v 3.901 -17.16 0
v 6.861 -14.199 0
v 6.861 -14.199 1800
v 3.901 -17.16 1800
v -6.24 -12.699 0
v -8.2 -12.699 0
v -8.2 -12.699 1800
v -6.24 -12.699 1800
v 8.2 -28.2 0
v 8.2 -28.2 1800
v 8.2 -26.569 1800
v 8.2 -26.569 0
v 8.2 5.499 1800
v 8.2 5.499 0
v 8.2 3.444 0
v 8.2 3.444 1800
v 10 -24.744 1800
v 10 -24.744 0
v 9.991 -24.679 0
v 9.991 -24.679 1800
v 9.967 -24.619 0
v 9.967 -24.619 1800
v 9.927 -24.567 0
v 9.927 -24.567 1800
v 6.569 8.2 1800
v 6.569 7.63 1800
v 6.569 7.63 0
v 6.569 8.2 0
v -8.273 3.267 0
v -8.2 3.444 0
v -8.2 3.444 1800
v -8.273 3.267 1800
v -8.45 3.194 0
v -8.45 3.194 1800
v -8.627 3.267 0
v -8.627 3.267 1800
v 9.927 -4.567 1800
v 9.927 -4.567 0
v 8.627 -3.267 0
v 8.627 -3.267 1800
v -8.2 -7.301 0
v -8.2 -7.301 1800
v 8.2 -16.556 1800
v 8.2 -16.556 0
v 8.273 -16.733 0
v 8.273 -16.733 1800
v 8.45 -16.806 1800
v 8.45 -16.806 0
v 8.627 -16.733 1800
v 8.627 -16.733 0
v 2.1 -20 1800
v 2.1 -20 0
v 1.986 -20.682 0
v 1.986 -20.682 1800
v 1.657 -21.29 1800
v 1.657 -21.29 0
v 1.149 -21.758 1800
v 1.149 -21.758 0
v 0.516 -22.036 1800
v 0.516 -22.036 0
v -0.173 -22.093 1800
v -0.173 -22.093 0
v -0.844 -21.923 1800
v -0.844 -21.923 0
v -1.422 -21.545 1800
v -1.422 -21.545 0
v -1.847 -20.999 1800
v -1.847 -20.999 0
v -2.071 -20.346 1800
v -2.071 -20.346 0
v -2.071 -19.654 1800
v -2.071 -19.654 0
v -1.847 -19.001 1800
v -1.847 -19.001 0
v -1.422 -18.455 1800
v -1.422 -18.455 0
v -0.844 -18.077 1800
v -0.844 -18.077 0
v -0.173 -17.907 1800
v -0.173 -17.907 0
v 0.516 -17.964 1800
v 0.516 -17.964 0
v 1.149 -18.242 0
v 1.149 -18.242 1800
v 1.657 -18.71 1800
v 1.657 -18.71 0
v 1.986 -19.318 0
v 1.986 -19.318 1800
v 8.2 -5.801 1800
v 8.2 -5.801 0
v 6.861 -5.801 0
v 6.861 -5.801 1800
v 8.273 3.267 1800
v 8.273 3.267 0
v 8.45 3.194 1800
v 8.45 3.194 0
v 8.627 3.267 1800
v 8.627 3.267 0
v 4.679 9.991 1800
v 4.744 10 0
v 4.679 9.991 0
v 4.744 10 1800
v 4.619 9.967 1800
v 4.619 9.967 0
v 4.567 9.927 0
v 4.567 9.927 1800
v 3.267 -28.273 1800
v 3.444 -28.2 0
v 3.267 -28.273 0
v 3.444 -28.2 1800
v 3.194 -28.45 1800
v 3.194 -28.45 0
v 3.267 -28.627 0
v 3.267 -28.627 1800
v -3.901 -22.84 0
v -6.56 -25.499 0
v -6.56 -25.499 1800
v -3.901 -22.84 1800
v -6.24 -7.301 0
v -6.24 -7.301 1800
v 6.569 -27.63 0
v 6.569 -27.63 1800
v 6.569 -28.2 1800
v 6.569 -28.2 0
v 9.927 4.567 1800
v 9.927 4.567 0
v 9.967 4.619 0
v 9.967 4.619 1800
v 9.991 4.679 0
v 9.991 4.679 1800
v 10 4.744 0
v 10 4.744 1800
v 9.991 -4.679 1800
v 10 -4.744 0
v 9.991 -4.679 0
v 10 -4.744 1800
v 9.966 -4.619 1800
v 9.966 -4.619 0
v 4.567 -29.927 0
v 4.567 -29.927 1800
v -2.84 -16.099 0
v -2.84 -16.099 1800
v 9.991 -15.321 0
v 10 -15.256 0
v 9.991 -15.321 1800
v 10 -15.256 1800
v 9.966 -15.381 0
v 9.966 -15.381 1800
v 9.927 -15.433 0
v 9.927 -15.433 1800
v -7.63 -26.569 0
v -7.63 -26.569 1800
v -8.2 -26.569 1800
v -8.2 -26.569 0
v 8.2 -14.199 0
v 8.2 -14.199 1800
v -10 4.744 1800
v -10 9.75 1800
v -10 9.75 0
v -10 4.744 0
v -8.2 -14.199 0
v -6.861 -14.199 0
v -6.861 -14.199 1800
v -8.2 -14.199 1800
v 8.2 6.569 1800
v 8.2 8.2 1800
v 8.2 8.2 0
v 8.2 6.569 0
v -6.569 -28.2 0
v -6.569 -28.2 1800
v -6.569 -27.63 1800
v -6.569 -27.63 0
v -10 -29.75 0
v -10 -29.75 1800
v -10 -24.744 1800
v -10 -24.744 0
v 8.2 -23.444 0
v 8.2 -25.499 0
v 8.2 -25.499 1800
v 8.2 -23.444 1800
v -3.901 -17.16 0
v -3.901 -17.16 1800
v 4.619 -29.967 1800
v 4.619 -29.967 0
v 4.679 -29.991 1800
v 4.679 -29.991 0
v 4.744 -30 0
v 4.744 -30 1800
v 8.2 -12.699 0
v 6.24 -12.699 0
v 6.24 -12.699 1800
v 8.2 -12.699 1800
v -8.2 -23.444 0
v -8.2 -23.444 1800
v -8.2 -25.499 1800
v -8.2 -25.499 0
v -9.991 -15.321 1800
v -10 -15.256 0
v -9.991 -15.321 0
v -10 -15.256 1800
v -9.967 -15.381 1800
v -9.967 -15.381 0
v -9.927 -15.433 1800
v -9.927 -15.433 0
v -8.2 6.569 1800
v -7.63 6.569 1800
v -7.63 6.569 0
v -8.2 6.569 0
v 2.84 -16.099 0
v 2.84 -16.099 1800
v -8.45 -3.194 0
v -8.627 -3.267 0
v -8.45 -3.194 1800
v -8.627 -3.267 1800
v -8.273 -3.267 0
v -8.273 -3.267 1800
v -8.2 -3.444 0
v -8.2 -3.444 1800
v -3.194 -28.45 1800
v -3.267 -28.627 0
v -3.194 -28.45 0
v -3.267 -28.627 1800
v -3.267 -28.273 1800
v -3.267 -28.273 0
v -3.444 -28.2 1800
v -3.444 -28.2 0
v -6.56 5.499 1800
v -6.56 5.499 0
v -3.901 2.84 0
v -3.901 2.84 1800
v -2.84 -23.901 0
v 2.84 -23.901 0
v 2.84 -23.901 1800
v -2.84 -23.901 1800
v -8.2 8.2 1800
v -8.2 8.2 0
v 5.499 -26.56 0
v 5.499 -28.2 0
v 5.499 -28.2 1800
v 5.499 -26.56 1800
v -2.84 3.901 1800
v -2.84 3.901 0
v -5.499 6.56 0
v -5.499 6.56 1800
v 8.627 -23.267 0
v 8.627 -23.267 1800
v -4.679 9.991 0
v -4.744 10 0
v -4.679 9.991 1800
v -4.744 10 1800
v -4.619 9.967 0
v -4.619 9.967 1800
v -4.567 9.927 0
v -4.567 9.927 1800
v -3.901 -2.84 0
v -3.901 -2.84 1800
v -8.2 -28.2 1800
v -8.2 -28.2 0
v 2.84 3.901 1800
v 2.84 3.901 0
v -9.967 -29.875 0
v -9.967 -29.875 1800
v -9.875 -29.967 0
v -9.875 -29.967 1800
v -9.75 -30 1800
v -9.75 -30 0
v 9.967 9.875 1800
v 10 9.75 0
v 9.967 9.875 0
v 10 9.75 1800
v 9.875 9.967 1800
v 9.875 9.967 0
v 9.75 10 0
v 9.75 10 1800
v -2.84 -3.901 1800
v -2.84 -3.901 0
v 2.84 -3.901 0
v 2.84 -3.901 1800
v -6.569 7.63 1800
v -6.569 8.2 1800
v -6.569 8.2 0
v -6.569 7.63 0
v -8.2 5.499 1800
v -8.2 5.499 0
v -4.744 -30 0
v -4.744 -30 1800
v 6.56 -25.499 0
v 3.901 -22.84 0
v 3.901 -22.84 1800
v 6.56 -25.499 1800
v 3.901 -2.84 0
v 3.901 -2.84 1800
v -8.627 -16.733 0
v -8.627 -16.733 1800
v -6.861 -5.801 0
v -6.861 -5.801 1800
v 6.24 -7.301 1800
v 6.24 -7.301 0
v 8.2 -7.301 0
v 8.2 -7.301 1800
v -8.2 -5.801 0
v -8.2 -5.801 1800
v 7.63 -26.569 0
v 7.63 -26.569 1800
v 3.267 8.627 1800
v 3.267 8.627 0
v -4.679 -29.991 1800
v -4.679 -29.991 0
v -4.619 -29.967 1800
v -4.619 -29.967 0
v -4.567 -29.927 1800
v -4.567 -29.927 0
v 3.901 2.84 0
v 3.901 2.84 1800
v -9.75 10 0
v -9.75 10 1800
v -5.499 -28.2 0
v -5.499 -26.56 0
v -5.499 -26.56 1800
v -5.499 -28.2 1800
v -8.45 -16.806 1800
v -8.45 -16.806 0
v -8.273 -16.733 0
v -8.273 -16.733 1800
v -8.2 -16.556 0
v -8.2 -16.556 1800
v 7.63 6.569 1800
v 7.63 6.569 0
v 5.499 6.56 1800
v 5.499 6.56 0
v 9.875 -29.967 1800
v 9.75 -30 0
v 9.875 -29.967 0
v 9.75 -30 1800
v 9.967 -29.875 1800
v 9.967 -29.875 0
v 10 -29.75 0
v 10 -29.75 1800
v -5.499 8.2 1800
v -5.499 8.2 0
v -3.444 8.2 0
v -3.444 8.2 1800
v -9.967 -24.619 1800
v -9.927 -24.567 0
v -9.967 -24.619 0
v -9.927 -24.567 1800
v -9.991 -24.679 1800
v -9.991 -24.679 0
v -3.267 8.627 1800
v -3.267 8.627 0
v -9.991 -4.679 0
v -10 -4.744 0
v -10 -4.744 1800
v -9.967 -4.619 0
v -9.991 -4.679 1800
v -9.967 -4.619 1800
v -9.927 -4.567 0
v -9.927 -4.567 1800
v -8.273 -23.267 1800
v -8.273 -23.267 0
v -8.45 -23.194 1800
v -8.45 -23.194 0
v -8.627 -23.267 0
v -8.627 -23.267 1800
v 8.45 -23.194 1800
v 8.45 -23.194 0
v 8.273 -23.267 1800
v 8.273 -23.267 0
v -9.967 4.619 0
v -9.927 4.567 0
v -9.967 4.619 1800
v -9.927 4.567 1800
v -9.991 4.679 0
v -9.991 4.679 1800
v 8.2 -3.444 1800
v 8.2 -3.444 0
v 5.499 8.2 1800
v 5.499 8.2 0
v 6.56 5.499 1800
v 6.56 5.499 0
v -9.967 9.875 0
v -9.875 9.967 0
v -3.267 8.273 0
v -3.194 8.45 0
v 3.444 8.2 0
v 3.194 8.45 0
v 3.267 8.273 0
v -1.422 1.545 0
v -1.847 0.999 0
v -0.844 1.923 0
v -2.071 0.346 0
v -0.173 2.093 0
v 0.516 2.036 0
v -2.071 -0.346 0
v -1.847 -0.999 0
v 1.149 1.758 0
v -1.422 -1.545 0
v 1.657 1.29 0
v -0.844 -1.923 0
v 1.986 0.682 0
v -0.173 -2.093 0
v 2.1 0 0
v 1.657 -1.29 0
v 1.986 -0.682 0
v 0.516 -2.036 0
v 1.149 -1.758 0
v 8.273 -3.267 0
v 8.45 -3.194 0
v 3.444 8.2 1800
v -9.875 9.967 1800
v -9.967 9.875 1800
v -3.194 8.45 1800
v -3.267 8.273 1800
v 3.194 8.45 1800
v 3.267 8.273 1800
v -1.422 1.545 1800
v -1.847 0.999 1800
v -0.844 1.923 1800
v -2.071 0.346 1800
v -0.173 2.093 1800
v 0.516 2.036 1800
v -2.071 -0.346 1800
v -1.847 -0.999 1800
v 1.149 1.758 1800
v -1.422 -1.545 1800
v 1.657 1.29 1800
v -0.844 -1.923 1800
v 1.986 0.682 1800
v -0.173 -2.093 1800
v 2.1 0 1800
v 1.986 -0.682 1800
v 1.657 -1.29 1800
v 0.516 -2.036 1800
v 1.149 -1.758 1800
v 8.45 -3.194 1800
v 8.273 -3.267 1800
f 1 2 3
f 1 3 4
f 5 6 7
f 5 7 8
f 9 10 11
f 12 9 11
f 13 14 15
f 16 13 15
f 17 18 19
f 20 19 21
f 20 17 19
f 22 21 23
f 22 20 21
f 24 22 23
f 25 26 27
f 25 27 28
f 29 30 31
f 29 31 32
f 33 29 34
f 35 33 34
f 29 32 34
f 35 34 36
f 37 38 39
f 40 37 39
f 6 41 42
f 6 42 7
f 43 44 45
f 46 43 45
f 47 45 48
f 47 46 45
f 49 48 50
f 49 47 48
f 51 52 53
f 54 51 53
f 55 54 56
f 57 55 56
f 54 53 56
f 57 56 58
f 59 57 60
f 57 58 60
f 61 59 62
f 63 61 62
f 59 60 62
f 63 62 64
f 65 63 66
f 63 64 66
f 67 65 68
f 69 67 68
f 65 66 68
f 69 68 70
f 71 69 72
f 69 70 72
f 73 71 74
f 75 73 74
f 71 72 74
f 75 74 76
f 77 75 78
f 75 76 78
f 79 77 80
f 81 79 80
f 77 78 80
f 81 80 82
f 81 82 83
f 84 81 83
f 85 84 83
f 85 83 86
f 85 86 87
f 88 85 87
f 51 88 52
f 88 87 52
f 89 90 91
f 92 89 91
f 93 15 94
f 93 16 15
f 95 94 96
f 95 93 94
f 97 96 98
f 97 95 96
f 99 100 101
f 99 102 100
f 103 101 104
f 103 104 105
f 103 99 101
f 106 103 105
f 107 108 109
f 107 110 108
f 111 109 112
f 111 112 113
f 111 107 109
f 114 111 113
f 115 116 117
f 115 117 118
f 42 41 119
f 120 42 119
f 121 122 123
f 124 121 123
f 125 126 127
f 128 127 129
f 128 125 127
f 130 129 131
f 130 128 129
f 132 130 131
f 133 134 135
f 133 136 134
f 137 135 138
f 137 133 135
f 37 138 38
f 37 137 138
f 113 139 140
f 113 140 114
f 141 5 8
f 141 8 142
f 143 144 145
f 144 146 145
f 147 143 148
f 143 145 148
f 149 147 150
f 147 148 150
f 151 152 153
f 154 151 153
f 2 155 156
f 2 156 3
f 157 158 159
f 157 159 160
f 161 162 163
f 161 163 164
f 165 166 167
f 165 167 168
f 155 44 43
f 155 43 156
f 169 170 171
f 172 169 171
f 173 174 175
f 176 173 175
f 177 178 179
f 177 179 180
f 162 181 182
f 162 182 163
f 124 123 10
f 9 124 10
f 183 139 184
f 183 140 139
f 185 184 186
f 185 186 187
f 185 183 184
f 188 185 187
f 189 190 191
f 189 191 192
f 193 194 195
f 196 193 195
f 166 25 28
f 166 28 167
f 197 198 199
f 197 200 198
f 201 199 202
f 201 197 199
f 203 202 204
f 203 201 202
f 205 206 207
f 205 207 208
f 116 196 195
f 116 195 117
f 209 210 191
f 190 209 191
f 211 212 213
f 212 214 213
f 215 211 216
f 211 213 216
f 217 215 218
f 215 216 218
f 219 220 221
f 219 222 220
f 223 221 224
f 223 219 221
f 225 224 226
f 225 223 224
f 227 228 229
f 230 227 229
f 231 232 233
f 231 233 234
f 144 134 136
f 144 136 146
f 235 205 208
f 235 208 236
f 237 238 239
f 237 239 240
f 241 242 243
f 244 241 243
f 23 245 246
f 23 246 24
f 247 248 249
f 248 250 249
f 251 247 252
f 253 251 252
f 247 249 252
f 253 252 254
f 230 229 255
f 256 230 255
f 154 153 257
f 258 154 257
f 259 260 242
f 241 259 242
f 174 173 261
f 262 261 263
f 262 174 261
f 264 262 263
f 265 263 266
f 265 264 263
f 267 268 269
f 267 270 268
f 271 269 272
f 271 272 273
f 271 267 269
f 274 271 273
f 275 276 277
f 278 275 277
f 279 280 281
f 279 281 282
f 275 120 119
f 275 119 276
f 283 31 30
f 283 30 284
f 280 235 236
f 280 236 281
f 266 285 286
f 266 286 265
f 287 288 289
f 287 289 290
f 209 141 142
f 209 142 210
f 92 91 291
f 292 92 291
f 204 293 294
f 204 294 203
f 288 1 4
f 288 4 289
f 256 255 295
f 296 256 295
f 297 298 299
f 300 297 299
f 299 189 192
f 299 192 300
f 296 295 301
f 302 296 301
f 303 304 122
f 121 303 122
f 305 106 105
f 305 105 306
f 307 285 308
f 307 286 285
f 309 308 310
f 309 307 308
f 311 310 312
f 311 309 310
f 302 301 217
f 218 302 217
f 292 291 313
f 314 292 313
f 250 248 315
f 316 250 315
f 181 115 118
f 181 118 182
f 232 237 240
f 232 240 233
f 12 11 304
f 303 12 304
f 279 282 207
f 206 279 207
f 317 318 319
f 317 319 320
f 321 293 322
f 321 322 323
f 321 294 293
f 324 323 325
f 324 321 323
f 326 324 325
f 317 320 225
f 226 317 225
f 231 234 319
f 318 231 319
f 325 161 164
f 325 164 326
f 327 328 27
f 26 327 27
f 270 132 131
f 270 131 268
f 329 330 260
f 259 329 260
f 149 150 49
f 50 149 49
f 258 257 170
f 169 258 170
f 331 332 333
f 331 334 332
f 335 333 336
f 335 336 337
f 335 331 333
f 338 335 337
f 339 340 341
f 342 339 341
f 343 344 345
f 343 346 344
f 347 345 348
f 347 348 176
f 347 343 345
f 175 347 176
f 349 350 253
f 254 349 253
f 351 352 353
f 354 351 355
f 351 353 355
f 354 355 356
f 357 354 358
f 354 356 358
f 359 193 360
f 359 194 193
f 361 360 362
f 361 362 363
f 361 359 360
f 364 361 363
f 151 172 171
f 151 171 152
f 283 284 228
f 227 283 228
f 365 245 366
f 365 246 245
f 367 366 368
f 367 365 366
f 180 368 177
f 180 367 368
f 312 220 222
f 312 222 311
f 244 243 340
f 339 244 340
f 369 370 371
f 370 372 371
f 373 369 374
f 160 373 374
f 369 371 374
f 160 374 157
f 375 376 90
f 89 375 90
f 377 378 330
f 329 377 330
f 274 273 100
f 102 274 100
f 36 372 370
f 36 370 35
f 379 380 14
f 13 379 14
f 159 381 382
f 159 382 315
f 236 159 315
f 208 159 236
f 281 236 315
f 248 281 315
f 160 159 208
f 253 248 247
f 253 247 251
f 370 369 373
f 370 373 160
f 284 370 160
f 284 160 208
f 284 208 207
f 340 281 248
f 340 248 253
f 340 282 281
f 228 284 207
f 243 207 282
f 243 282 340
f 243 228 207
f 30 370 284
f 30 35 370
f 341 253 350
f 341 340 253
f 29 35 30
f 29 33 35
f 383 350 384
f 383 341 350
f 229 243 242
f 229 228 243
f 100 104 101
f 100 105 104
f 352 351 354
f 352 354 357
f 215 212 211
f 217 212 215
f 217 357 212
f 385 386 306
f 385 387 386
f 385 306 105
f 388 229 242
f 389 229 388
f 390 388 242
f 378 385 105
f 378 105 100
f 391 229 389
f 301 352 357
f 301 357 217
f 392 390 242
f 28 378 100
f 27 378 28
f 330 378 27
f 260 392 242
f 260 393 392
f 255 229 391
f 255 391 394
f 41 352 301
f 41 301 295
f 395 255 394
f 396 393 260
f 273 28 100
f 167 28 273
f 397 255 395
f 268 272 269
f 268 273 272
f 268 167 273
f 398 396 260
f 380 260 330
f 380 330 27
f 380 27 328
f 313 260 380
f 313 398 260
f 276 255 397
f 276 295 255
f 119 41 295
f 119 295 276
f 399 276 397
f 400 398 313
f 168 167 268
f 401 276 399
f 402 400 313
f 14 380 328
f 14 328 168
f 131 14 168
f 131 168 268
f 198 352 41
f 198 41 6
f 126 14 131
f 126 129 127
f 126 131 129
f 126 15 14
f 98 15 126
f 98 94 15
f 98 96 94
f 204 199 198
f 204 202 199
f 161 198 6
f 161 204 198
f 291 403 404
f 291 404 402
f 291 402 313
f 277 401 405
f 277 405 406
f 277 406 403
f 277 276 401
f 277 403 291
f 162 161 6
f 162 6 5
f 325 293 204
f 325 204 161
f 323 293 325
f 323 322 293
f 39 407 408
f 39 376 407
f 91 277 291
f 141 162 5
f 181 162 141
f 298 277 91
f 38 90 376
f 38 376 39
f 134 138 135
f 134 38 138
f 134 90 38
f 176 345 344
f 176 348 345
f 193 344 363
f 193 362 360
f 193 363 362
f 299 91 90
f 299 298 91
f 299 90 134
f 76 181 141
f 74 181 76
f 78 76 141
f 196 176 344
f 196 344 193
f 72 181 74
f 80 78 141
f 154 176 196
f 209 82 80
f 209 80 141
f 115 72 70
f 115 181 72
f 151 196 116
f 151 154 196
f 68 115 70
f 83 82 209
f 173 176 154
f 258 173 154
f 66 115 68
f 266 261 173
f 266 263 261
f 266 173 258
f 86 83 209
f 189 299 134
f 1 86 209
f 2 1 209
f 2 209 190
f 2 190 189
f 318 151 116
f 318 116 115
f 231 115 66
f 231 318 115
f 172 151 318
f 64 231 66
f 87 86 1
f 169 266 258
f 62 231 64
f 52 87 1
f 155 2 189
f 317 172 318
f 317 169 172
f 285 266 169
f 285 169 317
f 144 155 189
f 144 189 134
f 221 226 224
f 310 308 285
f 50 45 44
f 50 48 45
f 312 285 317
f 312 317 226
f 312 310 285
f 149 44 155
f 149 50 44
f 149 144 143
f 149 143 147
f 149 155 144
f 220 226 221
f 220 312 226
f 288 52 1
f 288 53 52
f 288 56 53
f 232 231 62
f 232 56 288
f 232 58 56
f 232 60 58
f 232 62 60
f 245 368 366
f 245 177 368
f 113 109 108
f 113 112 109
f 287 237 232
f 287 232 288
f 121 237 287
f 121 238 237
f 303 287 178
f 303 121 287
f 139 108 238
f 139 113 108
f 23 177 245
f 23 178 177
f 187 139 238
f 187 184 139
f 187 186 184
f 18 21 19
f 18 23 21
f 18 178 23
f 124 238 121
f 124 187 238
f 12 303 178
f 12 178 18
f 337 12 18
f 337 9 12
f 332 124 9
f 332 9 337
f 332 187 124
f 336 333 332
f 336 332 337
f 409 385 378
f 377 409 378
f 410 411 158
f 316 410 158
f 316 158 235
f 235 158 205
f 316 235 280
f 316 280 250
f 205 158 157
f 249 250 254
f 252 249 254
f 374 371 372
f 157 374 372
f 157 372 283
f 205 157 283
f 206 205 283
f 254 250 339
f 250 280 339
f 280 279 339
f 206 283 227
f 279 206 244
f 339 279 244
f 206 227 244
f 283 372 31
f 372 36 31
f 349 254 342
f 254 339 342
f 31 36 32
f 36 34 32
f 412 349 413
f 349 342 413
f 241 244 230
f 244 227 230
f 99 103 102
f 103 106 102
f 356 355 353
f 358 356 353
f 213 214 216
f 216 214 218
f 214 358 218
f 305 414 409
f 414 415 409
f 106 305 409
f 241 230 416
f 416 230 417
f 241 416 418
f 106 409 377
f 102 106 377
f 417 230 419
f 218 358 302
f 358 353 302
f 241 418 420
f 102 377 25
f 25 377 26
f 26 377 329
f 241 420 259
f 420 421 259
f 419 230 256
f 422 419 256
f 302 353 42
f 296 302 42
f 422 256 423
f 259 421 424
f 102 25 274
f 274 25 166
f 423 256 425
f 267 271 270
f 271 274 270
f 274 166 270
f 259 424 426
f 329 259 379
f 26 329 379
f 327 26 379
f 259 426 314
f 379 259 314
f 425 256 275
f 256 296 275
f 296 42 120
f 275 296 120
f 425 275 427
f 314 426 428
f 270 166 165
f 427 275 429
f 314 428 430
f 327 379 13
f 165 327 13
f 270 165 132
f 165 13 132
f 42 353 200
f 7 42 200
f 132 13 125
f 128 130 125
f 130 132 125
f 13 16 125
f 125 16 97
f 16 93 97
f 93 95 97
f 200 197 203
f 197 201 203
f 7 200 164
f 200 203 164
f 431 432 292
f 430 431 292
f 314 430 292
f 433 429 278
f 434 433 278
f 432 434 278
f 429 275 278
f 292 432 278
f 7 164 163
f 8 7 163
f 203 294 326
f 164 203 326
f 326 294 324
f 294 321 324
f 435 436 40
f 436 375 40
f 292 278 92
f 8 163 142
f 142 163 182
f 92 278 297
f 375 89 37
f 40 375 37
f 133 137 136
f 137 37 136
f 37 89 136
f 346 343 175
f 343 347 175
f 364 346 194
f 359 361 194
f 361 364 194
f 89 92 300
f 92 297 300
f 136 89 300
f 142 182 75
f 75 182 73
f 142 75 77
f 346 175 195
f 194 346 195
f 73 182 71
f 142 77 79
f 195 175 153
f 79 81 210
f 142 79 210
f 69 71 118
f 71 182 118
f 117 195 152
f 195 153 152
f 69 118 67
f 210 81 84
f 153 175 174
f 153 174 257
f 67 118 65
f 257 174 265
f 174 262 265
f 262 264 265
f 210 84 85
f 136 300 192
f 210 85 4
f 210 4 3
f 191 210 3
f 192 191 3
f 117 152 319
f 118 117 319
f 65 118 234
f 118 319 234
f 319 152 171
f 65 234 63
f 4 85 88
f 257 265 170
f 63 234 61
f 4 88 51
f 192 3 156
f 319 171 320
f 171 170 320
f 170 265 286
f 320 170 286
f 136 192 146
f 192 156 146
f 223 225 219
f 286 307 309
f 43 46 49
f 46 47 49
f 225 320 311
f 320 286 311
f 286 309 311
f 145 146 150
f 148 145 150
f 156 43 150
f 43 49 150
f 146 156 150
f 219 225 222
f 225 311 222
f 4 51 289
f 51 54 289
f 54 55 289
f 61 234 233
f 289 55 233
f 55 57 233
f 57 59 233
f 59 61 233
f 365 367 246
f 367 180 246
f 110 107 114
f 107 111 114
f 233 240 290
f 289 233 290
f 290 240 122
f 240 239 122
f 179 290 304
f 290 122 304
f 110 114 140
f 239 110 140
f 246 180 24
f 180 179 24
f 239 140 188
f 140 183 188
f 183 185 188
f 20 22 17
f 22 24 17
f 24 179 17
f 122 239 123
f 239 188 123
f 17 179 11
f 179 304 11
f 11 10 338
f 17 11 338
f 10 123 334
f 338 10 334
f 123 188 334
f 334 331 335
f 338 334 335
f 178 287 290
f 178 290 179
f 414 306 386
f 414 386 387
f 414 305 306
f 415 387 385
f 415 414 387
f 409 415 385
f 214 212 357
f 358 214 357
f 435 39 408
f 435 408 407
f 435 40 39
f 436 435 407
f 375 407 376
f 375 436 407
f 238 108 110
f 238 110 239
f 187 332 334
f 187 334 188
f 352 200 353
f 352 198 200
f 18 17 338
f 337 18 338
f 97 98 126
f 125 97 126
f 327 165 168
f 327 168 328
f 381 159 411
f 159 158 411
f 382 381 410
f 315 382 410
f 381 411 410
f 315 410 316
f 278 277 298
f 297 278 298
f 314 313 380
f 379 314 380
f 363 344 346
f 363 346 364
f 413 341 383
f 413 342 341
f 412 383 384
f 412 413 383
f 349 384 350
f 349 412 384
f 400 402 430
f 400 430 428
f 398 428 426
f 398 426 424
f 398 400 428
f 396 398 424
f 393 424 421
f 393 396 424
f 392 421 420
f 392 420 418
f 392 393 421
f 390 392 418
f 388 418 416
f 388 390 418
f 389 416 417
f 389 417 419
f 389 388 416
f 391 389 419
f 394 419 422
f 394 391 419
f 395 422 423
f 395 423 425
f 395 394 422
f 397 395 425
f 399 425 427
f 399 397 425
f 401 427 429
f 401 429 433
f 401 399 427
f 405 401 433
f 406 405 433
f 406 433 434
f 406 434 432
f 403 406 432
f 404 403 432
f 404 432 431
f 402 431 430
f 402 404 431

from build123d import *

# Parameters (mm, degrees)
SKETCH1_R            = 2.1
BOSS_EXTRUDE2_DEPTH  = 1800
CUT_EXTRUDE1_DEPTH   = 1801
FILLET1_R            = 0.25
FILLET1_OF_MIRROR1_R = 0.25


with BuildPart() as part:
    # Sketch1 → Boss-Extrude2 (new body)
    with BuildSketch(Plane.XY):
        Polygon((8.199993721, -10), (9.999993721, -10), (9.999993721, -4.63999575), (8.199993721, -2.84), (8.199993721, -5.800653822), (6.861313026, -5.800653822), (3.900652213, -2.84), (3.900652213, 2.84), (6.559993721, 5.499347787), (8.199993721, 5.499347787), (8.199993721, 2.84), (9.999993721, 4.64000425), (9.999993721, 10), (4.63999575, 10), (2.84, 8.2), (5.499325592, 8.2), (5.499325592, 6.56), (2.84, 3.900668129), (-2.84, 3.900668129), (-5.49933815, 6.56), (-5.49933815, 8.2), (-2.84, 8.2), (-4.64000425, 10), (-10.000006279, 10), (-10.000006279, 4.63999575), (-8.200006279, 2.84), (-8.200006279, 5.499347787), (-6.560006279, 5.499347787), (-3.900652213, 2.84), (-3.900652213, -2.84), (-6.861299044, -5.800653822), (-8.200006279, -5.800653822), (-8.200006279, -2.84), (-10.000006279, -4.64000425), (-10.000006279, -10), (-8.200006279, -10), (-8.200006279, -7.300653822), (-6.239977665, -7.300653822), (-2.84, -3.900668129), (2.84, -3.900668129), (6.239993721, -7.300653822), (8.199993721, -7.300653822), align=None)
        Circle(SKETCH1_R, mode=Mode.SUBTRACT)
    boss_extrude2 = extrude(amount=BOSS_EXTRUDE2_DEPTH)

    # Sketch2 → Cut-Extrude1 (cut, through all)
    with BuildSketch(Plane.XY.offset(1800)):
        Polygon((-8.200006279, 6.569347787), (-8.200006279, 8.2), (-6.56933815, 8.2), (-6.56933815, 7.630009211), (-7.62999707, 6.569347787), align=None)
        Polygon((8.199993721, 8.2), (8.199993721, 6.569347787), (7.629987016, 6.569347787), (6.569325592, 7.630006706), (6.569325592, 8.2), align=None)
    cut_extrude1 = extrude(amount=-CUT_EXTRUDE1_DEPTH, mode=Mode.SUBTRACT)

    # Fillet1
    fillet1_edges = [part.edges().sort_by_distance(p)[0] for p in [
        (9.999993721, -4.63999575, 900),
        (-10.000006279, -4.64000425, 900),
        (-8.200006279, -2.84, 900),
        (-8.200006279, 2.84, 900),
        (-10.000006279, 4.63999575, 900),
        (-10.000006279, 10, 900),
        (-4.64000425, 10, 900),
        (-2.84, 8.2, 900),
        (2.84, 8.2, 900),
        (4.63999575, 10, 900),
        (9.999993721, 10, 900),
        (9.999993721, 4.64000425, 900),
        (8.199993721, 2.84, 900),
        (8.199993721, -2.84, 900),
    ]]
    fillet(fillet1_edges, radius=FILLET1_R)

    # Mirror1: Boss-Extrude2 across plane
    add(boss_extrude2.mirror(Plane(origin=(0, -10, 0), x_dir=(0, 0, 1), z_dir=(0, -1, 0))))

    # Fillet1 of Mirror1
    fillet1_of_mirror1_edges = [part.edges().sort_by_distance(p)[0] for p in [
        (9.999993721, -15.36000425, 900),
        (-10.000006279, -15.35999575, 900),
        (-8.200006279, -17.16, 900),
        (-8.200006279, -22.84, 900),
        (-10.000006279, -24.63999575, 900),
        (-10.000006279, -30, 900),
        (-4.64000425, -30, 900),
        (-2.84, -28.2, 900),
        (2.84, -28.2, 900),
        (4.63999575, -30, 900),
        (9.999993721, -30, 900),
        (9.999993721, -24.64000425, 900),
        (8.199993721, -22.84, 900),
        (8.199993721, -17.16, 900),
    ]]
    fillet(fillet1_of_mirror1_edges, radius=FILLET1_OF_MIRROR1_R)

    # Mirror2: Cut-Extrude1 across plane
    add(cut_extrude1.mirror(Plane(origin=(0, -10, 0), x_dir=(0, 0, 1), z_dir=(0, -1, 0))), mode=Mode.SUBTRACT)


solid = part.part
